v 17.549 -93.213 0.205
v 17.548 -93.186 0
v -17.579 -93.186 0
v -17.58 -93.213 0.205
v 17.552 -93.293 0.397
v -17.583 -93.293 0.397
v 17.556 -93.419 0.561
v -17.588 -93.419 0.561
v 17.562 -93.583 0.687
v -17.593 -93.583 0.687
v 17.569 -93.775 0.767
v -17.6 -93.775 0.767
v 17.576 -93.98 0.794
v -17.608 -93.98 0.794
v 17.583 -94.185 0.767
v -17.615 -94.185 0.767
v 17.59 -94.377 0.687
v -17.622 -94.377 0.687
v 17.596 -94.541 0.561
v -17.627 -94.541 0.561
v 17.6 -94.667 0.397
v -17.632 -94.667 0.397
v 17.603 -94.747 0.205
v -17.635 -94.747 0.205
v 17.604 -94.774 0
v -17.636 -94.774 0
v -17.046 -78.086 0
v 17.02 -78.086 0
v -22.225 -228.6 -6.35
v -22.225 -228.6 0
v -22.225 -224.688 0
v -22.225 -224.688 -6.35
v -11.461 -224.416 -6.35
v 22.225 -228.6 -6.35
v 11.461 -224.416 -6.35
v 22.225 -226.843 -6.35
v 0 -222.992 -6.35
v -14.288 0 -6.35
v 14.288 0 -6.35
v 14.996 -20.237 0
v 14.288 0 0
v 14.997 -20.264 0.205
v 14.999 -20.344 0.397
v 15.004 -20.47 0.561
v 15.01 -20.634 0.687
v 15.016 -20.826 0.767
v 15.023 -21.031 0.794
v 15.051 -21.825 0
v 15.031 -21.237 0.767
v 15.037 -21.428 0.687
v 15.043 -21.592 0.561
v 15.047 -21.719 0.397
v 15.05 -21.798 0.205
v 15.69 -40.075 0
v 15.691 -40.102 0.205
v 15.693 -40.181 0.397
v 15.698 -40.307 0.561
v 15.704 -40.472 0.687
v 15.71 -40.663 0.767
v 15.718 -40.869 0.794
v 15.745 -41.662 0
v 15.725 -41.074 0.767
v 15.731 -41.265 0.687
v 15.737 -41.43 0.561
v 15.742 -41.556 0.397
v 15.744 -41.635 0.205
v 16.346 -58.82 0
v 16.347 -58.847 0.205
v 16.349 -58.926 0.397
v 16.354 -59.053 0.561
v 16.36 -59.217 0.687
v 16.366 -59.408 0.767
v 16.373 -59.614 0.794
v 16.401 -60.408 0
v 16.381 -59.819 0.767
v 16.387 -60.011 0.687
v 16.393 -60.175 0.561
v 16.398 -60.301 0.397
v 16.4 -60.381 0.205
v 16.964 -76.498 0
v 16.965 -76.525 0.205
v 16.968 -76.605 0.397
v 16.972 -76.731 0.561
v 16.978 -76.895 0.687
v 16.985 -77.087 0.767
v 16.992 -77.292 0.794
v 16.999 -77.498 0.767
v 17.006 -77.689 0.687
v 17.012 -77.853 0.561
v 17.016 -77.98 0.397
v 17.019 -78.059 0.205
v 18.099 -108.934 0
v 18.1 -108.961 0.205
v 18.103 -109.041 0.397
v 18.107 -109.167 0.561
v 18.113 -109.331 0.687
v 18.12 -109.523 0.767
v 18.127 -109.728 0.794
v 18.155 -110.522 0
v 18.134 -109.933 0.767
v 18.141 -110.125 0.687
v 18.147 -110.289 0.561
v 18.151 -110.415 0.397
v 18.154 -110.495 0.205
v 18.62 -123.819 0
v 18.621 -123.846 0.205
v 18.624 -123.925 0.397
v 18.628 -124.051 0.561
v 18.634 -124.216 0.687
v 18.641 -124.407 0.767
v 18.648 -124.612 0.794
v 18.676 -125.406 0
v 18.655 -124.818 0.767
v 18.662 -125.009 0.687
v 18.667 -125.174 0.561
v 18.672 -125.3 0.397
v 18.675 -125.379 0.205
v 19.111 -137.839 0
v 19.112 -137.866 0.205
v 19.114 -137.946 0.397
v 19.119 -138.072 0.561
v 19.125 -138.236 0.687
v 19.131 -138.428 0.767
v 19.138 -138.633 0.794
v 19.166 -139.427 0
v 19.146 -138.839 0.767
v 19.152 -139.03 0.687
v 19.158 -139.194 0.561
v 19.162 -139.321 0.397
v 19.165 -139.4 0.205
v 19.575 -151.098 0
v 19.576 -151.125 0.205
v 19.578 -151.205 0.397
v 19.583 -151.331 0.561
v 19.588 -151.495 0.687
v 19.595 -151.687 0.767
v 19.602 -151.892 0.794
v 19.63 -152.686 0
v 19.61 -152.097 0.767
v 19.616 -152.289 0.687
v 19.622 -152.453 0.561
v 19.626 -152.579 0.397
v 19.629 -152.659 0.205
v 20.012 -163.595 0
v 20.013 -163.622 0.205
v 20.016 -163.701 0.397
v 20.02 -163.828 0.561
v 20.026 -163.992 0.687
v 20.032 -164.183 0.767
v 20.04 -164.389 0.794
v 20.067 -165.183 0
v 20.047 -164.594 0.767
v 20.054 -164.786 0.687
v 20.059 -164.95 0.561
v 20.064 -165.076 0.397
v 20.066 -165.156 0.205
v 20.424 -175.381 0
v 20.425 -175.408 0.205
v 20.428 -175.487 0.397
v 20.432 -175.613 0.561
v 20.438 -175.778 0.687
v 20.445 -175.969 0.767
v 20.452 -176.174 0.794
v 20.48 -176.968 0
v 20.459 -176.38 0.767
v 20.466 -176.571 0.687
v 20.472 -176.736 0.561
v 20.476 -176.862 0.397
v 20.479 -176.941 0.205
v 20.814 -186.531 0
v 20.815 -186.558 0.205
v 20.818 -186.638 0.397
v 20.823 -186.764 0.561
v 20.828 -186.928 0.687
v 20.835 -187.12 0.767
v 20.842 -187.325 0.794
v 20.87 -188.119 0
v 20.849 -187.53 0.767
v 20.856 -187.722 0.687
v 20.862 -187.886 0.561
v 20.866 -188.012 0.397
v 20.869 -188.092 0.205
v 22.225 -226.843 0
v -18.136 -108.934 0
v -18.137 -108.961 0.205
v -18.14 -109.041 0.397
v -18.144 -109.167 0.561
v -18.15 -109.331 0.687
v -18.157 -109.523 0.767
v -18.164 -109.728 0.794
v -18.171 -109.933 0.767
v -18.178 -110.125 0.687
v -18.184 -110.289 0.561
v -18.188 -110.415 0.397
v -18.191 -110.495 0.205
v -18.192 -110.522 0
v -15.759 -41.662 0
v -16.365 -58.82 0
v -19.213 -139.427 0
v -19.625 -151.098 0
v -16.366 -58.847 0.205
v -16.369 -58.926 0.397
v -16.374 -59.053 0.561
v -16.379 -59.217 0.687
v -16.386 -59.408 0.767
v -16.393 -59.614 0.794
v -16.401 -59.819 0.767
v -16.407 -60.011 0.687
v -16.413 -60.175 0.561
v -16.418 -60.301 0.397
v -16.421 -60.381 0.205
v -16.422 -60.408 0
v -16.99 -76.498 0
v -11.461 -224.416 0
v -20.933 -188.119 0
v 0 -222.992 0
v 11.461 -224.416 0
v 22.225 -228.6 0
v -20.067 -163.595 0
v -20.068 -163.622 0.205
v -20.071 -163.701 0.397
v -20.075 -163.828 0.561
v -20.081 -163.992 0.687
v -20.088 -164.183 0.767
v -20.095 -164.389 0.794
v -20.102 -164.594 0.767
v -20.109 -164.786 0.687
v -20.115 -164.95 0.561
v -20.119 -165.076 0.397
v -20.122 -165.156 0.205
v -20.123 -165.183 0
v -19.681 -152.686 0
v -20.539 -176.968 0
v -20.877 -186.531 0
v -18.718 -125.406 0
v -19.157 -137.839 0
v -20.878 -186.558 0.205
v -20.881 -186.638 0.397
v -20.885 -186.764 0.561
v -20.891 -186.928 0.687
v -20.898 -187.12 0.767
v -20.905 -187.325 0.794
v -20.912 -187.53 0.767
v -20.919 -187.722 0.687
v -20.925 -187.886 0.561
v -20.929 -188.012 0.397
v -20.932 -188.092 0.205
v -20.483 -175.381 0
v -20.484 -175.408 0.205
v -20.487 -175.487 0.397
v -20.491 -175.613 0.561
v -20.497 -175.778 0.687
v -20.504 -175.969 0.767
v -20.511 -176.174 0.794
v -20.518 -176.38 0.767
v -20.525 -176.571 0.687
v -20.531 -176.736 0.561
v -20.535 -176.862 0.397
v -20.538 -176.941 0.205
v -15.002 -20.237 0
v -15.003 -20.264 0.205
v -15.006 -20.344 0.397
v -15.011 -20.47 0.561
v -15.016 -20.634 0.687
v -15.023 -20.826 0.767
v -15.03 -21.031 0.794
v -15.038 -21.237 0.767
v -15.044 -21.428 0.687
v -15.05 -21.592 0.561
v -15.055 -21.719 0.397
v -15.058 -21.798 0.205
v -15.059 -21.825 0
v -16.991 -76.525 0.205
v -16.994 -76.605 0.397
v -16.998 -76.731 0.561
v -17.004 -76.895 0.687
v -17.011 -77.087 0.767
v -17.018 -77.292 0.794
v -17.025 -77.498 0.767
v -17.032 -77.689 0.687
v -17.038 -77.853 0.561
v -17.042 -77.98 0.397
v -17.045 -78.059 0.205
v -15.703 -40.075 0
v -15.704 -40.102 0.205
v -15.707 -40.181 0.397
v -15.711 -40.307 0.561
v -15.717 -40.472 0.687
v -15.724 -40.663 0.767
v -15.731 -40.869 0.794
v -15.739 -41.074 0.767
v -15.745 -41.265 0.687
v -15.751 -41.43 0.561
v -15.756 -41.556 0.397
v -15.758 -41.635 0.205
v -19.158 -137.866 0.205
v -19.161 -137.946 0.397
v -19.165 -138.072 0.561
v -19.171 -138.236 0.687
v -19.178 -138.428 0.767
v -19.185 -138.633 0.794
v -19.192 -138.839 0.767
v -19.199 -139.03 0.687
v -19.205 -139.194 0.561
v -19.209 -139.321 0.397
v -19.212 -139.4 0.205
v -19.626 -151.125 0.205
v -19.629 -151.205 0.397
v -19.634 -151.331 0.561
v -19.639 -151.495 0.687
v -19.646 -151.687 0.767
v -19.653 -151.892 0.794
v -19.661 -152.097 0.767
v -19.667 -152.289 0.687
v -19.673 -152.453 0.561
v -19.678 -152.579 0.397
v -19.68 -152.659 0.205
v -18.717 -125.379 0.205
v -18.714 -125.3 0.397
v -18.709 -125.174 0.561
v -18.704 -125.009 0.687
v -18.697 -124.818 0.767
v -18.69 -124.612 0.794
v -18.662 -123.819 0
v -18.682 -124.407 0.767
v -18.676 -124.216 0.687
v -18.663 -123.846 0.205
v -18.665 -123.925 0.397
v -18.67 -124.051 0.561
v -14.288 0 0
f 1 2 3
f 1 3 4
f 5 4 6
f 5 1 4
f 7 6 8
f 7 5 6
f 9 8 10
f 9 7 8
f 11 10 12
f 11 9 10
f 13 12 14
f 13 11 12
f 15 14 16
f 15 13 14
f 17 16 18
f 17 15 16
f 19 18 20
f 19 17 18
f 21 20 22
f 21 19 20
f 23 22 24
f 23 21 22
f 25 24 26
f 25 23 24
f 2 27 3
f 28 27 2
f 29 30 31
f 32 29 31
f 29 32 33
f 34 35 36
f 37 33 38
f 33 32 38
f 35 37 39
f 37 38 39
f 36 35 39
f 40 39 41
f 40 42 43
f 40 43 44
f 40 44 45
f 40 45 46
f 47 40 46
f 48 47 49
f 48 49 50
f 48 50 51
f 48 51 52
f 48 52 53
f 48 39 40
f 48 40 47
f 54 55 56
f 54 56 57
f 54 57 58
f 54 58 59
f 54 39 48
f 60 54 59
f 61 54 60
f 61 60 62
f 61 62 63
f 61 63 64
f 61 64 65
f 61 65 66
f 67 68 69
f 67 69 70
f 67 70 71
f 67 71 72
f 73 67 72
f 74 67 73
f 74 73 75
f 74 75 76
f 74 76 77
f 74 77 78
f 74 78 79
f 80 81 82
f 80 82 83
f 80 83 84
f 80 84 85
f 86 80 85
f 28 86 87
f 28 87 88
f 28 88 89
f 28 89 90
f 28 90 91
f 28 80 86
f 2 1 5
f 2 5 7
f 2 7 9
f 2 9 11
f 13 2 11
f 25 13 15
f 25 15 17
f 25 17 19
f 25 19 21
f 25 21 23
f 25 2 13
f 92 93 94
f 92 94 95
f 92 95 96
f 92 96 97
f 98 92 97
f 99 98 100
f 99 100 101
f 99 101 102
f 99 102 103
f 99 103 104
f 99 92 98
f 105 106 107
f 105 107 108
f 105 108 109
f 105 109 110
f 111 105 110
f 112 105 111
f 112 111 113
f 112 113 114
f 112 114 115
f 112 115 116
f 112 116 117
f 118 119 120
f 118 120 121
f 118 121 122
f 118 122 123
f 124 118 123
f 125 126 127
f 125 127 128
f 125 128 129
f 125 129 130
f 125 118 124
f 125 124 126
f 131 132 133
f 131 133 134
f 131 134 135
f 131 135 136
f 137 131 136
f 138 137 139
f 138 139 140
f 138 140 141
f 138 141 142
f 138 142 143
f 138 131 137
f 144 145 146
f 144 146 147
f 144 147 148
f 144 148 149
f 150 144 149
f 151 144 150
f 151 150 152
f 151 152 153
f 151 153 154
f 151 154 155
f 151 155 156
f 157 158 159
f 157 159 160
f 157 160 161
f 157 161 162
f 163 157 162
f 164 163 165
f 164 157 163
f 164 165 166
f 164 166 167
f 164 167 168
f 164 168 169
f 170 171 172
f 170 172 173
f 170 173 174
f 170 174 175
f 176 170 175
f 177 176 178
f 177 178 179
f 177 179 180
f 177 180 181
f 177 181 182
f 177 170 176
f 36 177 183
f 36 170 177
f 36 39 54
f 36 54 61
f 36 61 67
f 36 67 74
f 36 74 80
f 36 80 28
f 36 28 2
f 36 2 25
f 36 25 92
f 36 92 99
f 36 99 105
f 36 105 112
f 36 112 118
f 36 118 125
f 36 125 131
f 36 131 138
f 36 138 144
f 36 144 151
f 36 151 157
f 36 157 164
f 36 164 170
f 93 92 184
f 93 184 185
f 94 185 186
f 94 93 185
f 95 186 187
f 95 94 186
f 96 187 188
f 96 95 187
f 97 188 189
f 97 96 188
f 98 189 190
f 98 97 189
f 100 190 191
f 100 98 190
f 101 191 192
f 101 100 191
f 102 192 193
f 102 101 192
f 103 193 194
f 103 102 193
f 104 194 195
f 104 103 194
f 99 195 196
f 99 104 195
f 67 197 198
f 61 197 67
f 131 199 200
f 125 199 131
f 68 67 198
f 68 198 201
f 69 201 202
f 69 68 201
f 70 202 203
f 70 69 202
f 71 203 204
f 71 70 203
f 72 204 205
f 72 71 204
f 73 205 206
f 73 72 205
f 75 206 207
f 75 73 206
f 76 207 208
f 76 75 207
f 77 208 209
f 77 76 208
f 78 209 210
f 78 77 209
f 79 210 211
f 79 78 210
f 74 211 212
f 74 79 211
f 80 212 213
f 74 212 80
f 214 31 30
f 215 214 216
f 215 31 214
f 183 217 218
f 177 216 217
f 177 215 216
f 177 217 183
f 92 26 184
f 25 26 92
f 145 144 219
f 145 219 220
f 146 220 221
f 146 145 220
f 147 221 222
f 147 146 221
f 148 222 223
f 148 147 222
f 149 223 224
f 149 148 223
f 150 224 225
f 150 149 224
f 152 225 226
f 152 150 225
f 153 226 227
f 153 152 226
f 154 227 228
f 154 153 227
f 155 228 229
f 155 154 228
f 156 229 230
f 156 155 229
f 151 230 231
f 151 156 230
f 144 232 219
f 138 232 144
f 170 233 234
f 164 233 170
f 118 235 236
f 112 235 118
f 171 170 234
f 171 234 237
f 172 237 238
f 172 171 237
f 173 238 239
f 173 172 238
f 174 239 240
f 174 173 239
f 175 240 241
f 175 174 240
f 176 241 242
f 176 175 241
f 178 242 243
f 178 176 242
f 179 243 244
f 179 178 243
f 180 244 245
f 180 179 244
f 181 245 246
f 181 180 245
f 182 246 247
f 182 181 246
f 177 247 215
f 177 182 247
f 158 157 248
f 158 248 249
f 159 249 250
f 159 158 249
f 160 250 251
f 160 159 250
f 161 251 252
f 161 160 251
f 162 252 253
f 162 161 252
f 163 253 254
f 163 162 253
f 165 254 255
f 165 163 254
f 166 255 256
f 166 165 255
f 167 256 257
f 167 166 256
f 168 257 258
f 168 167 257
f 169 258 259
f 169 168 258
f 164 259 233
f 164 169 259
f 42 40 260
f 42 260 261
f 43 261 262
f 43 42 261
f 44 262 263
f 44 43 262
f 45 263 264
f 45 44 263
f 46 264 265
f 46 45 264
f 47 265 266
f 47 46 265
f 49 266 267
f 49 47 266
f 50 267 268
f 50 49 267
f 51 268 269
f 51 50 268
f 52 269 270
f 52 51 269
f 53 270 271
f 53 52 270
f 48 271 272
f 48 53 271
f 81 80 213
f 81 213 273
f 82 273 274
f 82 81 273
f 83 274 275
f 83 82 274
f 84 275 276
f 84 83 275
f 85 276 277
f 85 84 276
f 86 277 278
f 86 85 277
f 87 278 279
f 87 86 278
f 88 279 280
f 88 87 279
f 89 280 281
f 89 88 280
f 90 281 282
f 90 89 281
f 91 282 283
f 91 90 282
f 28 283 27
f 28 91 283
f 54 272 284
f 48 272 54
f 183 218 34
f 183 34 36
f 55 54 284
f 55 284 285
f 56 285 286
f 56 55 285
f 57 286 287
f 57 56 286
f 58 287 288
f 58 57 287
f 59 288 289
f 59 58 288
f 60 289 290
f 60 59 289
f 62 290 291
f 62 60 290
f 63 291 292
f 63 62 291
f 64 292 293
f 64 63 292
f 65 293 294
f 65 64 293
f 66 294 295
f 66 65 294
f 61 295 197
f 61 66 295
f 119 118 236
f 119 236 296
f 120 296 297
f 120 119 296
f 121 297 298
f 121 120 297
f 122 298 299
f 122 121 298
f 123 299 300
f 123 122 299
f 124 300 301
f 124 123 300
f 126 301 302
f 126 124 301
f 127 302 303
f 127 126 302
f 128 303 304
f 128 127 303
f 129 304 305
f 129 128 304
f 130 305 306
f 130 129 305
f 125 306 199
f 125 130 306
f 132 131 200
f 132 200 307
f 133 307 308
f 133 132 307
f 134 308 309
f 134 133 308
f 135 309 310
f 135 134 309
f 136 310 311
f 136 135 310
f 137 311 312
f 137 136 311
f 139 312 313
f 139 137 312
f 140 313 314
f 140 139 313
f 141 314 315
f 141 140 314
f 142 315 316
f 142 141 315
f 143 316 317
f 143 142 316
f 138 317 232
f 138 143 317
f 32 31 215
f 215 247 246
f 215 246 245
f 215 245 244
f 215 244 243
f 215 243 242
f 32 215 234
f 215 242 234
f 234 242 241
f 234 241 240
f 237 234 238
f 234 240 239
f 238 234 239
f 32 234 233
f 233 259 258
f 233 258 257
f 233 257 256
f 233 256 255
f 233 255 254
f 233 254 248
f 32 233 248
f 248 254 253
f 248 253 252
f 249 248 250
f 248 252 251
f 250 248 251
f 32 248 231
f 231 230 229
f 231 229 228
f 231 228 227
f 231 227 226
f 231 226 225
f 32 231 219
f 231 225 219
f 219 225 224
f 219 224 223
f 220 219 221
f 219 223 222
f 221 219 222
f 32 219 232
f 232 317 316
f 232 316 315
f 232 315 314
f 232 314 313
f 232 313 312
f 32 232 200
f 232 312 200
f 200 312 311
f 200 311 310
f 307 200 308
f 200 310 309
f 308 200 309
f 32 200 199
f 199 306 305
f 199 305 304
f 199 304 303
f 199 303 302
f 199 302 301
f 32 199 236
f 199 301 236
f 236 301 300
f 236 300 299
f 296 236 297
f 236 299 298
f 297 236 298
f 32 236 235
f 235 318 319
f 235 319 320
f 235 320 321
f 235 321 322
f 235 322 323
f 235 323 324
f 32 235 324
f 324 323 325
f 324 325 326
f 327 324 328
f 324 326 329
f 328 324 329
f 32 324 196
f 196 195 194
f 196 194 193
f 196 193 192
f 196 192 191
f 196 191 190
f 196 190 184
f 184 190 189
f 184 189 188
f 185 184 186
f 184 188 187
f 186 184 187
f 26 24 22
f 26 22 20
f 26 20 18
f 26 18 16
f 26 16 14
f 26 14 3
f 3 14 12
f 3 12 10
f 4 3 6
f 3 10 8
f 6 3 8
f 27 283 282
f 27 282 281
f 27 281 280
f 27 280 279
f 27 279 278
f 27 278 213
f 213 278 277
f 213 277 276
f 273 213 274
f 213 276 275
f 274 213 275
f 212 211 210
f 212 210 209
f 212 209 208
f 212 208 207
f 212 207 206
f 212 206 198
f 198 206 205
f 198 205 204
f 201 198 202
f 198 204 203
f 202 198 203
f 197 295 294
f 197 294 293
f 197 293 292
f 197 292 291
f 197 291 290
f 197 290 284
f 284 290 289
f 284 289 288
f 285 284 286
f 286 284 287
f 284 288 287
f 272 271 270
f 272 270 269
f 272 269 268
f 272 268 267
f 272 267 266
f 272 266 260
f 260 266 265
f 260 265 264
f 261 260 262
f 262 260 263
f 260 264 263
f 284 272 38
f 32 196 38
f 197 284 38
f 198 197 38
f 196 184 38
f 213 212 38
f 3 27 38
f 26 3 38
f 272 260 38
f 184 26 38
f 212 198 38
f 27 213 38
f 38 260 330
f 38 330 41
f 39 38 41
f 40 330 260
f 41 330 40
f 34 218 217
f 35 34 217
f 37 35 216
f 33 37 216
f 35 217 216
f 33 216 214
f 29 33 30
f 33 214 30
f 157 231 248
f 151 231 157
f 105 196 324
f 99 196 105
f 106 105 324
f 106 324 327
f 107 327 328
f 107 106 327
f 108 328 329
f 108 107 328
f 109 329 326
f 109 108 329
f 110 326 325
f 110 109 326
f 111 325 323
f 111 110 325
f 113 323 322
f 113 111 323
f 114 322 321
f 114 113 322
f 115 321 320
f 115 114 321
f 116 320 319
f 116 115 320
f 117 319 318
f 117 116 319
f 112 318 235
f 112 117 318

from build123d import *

# Parameters (mm, degrees)
F0_W     = 44.45
F0_H     = 228.6
F1_DEPTH = 6.35
F3_DEPTH = 44.45
F5_DEPTH = 12.7
F7_DEPTH = 25.4


with BuildPart() as f1:
    # F0 (on Top) → F1 (new body)
    with BuildSketch(Plane.XY):
        with Locations((0, -114.3)):
            Rectangle(F0_W, F0_H)
    extrude(amount=-F1_DEPTH)

    # F2 (on face) → F3 (join)
    with BuildSketch(Plane.YZ.offset(22.225)):
        with BuildLine():
            ThreePointArc((-21.82495, 0), (-21.592466, -0.561266), (-21.0312, -0.79375))
            Line((-21.0312, -0.79375), (-21.0312, 0))
            Line((-21.0312, 0), (-21.82495, 0))
        make_face()
        with BuildLine():
            Line((-21.0312, 0), (-21.0312, -0.79375))
            ThreePointArc((-21.0312, -0.79375), (-20.469934, -0.561266), (-20.23745, 0))
            Line((-20.23745, 0), (-21.0312, 0))
        make_face()
        with BuildLine():
            ThreePointArc((-41.66235, 0), (-41.429866, -0.561266), (-40.8686, -0.79375))
            Line((-40.8686, -0.79375), (-40.8686, 0))
            Line((-40.8686, 0), (-41.66235, 0))
        make_face()
        with BuildLine():
            Line((-40.8686, 0), (-40.8686, -0.79375))
            ThreePointArc((-40.8686, -0.79375), (-40.307334, -0.561266), (-40.07485, 0))
            Line((-40.07485, 0), (-40.8686, 0))
        make_face()
        with BuildLine():
            ThreePointArc((-60.40755, 0), (-60.175066, -0.561266), (-59.6138, -0.79375))
            Line((-59.6138, -0.79375), (-59.6138, 0))
            Line((-59.6138, 0), (-60.40755, 0))
        make_face()
        with BuildLine():
            Line((-59.6138, 0), (-59.6138, -0.79375))
            ThreePointArc((-59.6138, -0.79375), (-59.052534, -0.561266), (-58.82005, 0))
            Line((-58.82005, 0), (-59.6138, 0))
        make_face()
        with BuildLine():
            ThreePointArc((-78.08595, 0), (-77.853466, -0.561266), (-77.2922, -0.79375))
            Line((-77.2922, -0.79375), (-77.2922, 0))
            Line((-77.2922, 0), (-78.08595, 0))
        make_face()
        with BuildLine():
            Line((-77.2922, 0), (-77.2922, -0.79375))
            ThreePointArc((-77.2922, -0.79375), (-76.730934, -0.561266), (-76.49845, 0))
            Line((-76.49845, 0), (-77.2922, 0))
        make_face()
        with BuildLine():
            ThreePointArc((-94.77375, 0), (-94.541266, -0.561266), (-93.98, -0.79375))
            Line((-93.98, -0.79375), (-93.98, 0))
            Line((-93.98, 0), (-94.77375, 0))
        make_face()
        with BuildLine():
            Line((-93.98, 0), (-93.98, -0.79375))
            ThreePointArc((-93.98, -0.79375), (-93.418734, -0.561266), (-93.18625, 0))
            Line((-93.18625, 0), (-93.98, 0))
        make_face()
        with BuildLine():
            ThreePointArc((-110.52175, 0), (-110.289266, -0.561266), (-109.728, -0.79375))
            Line((-109.728, -0.79375), (-109.728, 0))
            Line((-109.728, 0), (-110.52175, 0))
        make_face()
        with BuildLine():
            Line((-109.728, 0), (-109.728, -0.79375))
            ThreePointArc((-109.728, -0.79375), (-109.166734, -0.561266), (-108.93425, 0))
            Line((-108.93425, 0), (-109.728, 0))
        make_face()
        with BuildLine():
            ThreePointArc((-125.40615, 0), (-125.173666, -0.561266), (-124.6124, -0.79375))
            Line((-124.6124, -0.79375), (-124.6124, 0))
            Line((-124.6124, 0), (-125.40615, 0))
        make_face()
        with BuildLine():
            Line((-124.6124, 0), (-124.6124, -0.79375))
            ThreePointArc((-124.6124, -0.79375), (-124.051134, -0.561266), (-123.81865, 0))
            Line((-123.81865, 0), (-124.6124, 0))
        make_face()
        with BuildLine():
            ThreePointArc((-139.42695, 0), (-139.194466, -0.561266), (-138.6332, -0.79375))
            Line((-138.6332, -0.79375), (-138.6332, 0))
            Line((-138.6332, 0), (-139.42695, 0))
        make_face()
        with BuildLine():
            Line((-138.6332, 0), (-138.6332, -0.79375))
            ThreePointArc((-138.6332, -0.79375), (-138.071934, -0.561266), (-137.83945, 0))
            Line((-137.83945, 0), (-138.6332, 0))
        make_face()
        with BuildLine():
            ThreePointArc((-152.68575, 0), (-152.453266, -0.561266), (-151.892, -0.79375))
            Line((-151.892, -0.79375), (-151.892, 0))
            Line((-151.892, 0), (-152.68575, 0))
        make_face()
        with BuildLine():
            Line((-151.892, 0), (-151.892, -0.79375))
            ThreePointArc((-151.892, -0.79375), (-151.330734, -0.561266), (-151.09825, 0))
            Line((-151.09825, 0), (-151.892, 0))
        make_face()
        with BuildLine():
            ThreePointArc((-165.18255, 0), (-164.950066, -0.561266), (-164.3888, -0.79375))
            Line((-164.3888, -0.79375), (-164.3888, 0))
            Line((-164.3888, 0), (-165.18255, 0))
        make_face()
        with BuildLine():
            Line((-164.3888, 0), (-164.3888, -0.79375))
            ThreePointArc((-164.3888, -0.79375), (-163.827534, -0.561266), (-163.59505, 0))
            Line((-163.59505, 0), (-164.3888, 0))
        make_face()
        with BuildLine():
            ThreePointArc((-176.96815, 0), (-176.735666, -0.561266), (-176.1744, -0.79375))
            Line((-176.1744, -0.79375), (-176.1744, 0))
            Line((-176.1744, 0), (-176.96815, 0))
        make_face()
        with BuildLine():
            Line((-176.1744, 0), (-176.1744, -0.79375))
            ThreePointArc((-176.1744, -0.79375), (-175.613134, -0.561266), (-175.38065, 0))
            Line((-175.38065, 0), (-176.1744, 0))
        make_face()
        with BuildLine():
            ThreePointArc((-188.11875, 0), (-187.886266, -0.561266), (-187.325, -0.79375))
            Line((-187.325, -0.79375), (-187.325, 0))
            Line((-187.325, 0), (-188.11875, 0))
        make_face()
        with BuildLine():
            Line((-187.325, 0), (-187.325, -0.79375))
            ThreePointArc((-187.325, -0.79375), (-186.763734, -0.561266), (-186.53125, 0))
            Line((-186.53125, 0), (-187.325, 0))
        make_face()
        with BuildLine():
            Line((-40.8686, 0), (-40.07485, 0))
            ThreePointArc((-40.07485, 0), (-40.8686, 0.79375), (-41.66235, 0))
            Line((-41.66235, 0), (-40.8686, 0))
        make_face()
        with BuildLine():
            Line((-59.6138, 0), (-58.82005, 0))
            ThreePointArc((-58.82005, 0), (-59.6138, 0.79375), (-60.40755, 0))
            Line((-60.40755, 0), (-59.6138, 0))
        make_face()
        with BuildLine():
            Line((-77.2922, 0), (-76.49845, 0))
            ThreePointArc((-76.49845, 0), (-77.2922, 0.79375), (-78.08595, 0))
            Line((-78.08595, 0), (-77.2922, 0))
        make_face()
        with BuildLine():
            Line((-93.98, 0), (-93.18625, 0))
            ThreePointArc((-93.18625, 0), (-93.98, 0.79375), (-94.77375, 0))
            Line((-94.77375, 0), (-93.98, 0))
        make_face()
        with BuildLine():
            Line((-109.728, 0), (-108.93425, 0))
            ThreePointArc((-108.93425, 0), (-109.728, 0.79375), (-110.52175, 0))
            Line((-110.52175, 0), (-109.728, 0))
        make_face()
        with BuildLine():
            Line((-124.6124, 0), (-123.81865, 0))
            ThreePointArc((-123.81865, 0), (-124.6124, 0.79375), (-125.40615, 0))
            Line((-125.40615, 0), (-124.6124, 0))
        make_face()
        with BuildLine():
            Line((-138.6332, 0), (-137.83945, 0))
            ThreePointArc((-137.83945, 0), (-138.6332, 0.79375), (-139.42695, 0))
            Line((-139.42695, 0), (-138.6332, 0))
        make_face()
        with BuildLine():
            Line((-151.892, 0), (-151.09825, 0))
            ThreePointArc((-151.09825, 0), (-151.892, 0.79375), (-152.68575, 0))
            Line((-152.68575, 0), (-151.892, 0))
        make_face()
        with BuildLine():
            Line((-164.3888, 0), (-163.59505, 0))
            ThreePointArc((-163.59505, 0), (-164.3888, 0.79375), (-165.18255, 0))
            Line((-165.18255, 0), (-164.3888, 0))
        make_face()
        with BuildLine():
            Line((-176.1744, 0), (-175.38065, 0))
            ThreePointArc((-175.38065, 0), (-176.1744, 0.79375), (-176.96815, 0))
            Line((-176.96815, 0), (-176.1744, 0))
        make_face()
        with BuildLine():
            Line((-187.325, 0), (-186.53125, 0))
            ThreePointArc((-186.53125, 0), (-187.325, 0.79375), (-188.11875, 0))
            Line((-188.11875, 0), (-187.325, 0))
        make_face()
        with BuildLine():
            Line((-21.82495, 0), (-21.0312, 0))
            Line((-21.0312, 0), (-20.23745, 0))
            ThreePointArc((-20.23745, 0), (-21.0312, 0.79375), (-21.82495, 0))
        make_face()
    extrude(amount=-F3_DEPTH)

    # F4 (on Top) → F5 (cut, symmetric)
    with BuildSketch(Plane.XY):
        Polygon((22.286486, 0), (14.2875, 0), (22.286486, -228.6), align=None)
        Polygon((-14.2875, 0), (-22.363186, 0), (-22.363186, -228.6), align=None)
    extrude(amount=F5_DEPTH, both=True, mode=Mode.SUBTRACT)

    # F6 (on face) → F7 (cut)
    with BuildSketch(Plane.XY):
        with BuildLine():
            Line((-22.225, -228.6), (22.225, -228.6))
            ThreePointArc((22.225, -228.6), (0, -222.991998), (-22.225, -228.6))
        make_face()
    extrude(amount=-F7_DEPTH, mode=Mode.SUBTRACT)


solid = f1.part
